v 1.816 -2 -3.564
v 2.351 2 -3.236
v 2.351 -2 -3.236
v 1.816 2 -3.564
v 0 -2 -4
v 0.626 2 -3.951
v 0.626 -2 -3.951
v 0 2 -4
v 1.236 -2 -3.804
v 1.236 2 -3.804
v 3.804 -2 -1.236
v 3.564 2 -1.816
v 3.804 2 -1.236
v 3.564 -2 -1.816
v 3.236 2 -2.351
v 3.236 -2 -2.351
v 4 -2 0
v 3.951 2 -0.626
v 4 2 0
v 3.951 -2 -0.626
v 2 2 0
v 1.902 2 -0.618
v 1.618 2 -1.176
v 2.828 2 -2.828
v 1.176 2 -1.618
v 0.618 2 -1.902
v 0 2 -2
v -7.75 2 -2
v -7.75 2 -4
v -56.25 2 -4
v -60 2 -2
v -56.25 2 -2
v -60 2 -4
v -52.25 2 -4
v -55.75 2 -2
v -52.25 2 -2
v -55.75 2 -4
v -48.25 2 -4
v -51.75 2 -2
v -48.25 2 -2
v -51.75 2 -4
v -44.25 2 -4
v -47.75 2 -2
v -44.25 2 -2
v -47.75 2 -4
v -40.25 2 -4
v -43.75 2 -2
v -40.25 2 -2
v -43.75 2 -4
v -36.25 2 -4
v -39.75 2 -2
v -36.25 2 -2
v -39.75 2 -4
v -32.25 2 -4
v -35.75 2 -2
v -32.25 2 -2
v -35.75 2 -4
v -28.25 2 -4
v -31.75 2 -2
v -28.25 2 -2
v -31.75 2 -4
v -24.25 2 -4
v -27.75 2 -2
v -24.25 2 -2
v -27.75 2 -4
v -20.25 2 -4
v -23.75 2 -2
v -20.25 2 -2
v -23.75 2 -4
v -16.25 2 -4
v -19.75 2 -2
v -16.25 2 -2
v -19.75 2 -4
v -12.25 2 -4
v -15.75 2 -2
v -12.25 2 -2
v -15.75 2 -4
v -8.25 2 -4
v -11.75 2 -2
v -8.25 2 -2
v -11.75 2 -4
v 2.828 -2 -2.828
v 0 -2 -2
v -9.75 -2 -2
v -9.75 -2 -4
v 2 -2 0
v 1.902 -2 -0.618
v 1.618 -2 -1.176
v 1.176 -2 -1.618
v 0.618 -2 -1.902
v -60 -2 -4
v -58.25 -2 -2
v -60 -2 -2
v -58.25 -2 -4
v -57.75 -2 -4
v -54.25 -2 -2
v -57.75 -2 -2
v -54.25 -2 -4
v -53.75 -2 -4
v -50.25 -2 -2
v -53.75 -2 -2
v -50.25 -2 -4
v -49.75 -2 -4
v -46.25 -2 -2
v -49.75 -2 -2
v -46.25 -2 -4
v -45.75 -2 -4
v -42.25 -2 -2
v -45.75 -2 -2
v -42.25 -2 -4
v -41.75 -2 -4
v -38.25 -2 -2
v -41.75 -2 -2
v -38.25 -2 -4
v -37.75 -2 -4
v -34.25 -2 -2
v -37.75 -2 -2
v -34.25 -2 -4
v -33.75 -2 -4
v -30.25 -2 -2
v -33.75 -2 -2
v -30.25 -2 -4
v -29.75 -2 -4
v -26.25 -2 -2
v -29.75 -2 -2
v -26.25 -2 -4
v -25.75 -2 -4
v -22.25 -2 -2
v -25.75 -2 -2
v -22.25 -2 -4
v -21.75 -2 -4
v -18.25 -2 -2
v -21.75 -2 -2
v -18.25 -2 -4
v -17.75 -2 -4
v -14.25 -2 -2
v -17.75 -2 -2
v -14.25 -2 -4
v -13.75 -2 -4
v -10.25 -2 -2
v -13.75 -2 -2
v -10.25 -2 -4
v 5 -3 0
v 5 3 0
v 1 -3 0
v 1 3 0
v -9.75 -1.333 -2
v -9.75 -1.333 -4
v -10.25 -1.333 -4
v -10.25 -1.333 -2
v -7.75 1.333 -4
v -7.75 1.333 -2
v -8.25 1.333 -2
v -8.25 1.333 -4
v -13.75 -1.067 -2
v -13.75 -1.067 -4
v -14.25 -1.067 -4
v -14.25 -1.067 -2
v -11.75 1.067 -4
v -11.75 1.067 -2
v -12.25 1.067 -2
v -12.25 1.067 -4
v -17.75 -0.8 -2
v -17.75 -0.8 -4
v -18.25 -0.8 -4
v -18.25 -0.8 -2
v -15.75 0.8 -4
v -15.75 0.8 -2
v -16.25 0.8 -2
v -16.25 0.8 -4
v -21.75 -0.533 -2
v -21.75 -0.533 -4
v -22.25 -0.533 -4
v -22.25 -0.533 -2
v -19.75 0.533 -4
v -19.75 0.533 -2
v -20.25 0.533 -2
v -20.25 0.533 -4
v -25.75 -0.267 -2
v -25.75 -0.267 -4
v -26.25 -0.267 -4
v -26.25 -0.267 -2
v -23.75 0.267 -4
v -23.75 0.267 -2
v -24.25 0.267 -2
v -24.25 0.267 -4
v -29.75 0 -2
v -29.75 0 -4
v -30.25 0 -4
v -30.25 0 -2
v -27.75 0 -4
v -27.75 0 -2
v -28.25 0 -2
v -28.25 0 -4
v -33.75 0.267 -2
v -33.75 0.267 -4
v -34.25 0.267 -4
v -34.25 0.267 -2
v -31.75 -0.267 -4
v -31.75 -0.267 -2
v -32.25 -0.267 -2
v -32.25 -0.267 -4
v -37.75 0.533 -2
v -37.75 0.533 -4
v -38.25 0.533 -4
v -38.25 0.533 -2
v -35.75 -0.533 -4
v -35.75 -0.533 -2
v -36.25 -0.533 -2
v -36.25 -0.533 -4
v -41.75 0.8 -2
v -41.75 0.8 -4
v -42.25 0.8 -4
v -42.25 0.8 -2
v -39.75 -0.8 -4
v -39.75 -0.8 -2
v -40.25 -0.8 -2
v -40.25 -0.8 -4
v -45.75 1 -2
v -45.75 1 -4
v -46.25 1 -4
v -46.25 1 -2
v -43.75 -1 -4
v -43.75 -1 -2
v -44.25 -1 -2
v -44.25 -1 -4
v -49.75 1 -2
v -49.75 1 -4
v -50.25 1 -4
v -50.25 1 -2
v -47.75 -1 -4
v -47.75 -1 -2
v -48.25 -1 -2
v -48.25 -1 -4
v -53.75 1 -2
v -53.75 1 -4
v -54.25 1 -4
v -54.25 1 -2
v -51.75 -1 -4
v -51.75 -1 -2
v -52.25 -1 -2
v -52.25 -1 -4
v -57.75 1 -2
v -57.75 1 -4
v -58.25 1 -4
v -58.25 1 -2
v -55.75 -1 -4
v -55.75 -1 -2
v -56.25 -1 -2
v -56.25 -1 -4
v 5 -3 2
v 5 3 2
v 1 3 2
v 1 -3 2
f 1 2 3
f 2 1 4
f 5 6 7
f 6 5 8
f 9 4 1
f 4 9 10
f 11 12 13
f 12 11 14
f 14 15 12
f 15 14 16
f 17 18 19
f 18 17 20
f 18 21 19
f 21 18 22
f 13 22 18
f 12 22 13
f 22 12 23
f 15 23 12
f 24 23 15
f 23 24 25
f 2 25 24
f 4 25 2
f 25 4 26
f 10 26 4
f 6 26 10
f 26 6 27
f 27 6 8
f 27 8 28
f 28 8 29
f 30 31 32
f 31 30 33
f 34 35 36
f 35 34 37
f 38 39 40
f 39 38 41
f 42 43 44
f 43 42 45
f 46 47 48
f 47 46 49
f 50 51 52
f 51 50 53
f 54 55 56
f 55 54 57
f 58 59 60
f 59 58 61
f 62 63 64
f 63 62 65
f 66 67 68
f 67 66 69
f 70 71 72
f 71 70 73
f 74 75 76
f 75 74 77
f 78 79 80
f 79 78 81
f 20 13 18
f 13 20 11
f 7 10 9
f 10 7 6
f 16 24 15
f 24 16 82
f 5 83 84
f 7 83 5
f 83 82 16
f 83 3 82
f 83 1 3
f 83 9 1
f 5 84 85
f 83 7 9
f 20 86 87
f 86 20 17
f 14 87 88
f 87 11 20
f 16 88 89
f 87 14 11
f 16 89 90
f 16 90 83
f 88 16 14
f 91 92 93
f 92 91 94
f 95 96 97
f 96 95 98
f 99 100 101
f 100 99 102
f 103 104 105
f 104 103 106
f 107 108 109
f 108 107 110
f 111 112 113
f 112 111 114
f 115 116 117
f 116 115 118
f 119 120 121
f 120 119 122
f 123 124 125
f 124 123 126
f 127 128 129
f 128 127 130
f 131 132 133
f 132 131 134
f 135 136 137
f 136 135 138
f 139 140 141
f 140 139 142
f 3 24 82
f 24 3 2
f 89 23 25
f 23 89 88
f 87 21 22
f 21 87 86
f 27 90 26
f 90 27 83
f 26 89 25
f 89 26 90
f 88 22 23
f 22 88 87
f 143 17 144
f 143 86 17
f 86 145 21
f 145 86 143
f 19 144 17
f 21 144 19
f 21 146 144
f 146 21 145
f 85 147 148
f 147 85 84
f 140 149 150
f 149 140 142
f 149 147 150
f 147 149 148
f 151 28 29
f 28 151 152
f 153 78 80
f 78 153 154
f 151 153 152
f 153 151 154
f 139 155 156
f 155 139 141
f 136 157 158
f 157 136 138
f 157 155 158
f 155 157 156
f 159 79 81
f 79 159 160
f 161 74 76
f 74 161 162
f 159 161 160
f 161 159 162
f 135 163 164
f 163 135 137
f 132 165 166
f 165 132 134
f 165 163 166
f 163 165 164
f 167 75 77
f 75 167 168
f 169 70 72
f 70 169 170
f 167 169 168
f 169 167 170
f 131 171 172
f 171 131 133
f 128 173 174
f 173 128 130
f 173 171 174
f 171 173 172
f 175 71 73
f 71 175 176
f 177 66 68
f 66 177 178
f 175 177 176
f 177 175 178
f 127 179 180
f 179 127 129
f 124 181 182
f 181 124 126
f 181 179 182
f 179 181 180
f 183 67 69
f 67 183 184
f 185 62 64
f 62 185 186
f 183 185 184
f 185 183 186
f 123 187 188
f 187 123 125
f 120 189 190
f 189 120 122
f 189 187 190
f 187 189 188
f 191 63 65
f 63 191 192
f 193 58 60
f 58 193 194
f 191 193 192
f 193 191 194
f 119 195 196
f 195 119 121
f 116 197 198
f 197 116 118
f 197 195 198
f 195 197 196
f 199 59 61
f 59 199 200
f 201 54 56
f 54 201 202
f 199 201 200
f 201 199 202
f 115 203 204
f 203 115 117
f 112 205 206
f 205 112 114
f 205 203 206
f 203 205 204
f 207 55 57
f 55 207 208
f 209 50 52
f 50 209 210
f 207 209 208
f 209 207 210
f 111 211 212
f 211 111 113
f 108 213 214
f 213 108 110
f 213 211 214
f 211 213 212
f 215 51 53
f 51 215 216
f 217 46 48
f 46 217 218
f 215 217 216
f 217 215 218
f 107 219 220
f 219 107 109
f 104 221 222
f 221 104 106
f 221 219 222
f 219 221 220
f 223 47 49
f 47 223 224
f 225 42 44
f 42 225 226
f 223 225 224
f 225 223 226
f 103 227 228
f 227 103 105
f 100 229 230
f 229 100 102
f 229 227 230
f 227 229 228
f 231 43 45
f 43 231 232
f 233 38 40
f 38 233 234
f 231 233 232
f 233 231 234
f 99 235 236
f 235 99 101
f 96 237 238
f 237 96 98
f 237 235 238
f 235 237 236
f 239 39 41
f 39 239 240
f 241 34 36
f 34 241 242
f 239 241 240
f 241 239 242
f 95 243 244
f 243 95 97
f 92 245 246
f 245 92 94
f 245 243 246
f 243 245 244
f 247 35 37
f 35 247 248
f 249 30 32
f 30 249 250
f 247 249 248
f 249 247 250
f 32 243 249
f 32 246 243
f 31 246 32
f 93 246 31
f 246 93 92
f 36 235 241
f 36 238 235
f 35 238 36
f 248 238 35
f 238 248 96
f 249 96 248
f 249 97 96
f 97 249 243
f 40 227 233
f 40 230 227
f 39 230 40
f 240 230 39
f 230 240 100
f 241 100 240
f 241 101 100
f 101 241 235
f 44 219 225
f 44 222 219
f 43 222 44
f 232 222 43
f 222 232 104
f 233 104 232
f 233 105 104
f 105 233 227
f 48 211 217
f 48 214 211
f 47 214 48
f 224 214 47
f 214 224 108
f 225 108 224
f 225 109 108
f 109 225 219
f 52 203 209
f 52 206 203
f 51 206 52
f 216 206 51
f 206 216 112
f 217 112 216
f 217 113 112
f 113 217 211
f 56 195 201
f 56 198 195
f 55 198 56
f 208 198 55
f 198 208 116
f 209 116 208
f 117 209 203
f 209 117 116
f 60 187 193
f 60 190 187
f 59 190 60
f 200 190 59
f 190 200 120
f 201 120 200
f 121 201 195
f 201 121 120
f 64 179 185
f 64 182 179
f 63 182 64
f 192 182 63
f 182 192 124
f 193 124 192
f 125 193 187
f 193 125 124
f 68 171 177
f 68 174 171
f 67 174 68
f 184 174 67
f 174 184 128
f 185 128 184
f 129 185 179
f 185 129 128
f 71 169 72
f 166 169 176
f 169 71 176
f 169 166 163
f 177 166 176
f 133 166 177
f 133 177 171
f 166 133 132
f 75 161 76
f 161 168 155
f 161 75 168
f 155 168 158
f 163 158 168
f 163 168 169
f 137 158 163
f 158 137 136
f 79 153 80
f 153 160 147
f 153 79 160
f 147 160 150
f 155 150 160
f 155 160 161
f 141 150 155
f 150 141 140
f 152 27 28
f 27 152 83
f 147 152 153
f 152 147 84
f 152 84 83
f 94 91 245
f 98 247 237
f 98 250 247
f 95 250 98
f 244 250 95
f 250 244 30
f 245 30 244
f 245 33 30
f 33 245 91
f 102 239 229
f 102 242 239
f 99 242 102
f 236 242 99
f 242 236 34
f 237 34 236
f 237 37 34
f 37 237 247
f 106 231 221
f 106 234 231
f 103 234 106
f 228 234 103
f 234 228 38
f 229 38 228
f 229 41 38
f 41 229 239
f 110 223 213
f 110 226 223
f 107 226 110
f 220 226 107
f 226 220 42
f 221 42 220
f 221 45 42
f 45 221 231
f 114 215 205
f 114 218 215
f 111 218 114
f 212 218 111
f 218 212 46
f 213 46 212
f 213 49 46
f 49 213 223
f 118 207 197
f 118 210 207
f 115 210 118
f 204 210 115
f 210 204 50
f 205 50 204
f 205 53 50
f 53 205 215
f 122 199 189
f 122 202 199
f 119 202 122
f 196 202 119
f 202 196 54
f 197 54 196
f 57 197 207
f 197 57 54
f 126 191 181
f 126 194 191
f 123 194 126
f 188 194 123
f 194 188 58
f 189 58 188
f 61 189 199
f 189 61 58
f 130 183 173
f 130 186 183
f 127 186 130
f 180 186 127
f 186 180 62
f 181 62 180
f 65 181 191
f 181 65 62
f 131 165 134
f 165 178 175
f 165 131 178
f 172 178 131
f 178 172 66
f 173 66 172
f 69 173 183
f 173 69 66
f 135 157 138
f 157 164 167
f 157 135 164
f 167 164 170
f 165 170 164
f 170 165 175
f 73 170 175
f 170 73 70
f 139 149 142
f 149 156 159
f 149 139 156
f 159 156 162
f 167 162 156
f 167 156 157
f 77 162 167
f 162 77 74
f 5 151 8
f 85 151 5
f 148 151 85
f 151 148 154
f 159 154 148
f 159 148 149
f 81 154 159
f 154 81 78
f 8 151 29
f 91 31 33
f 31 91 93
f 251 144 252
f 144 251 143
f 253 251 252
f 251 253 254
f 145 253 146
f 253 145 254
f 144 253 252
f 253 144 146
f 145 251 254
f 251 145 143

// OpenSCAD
h = 2;
w = 4;
l = 60;

//translate([0,-2,5])import("zipper-pull.stl");

module turn() {
    intersection () {
        rotate([90,0,0])
            difference() {
                cylinder(r=h+h, h=w, $fn=40, center=true);
                cylinder(r=h, h=w*1.1, $fn=20, center=true);
            };
         translate([w/2,0,-w/2])
            cube([w,w*1.1,w],true);
    }
       
}

module cap() {
    translate([3*h/2,0,h/2])
        cube([h+2,w+2,h],true);
}

module tail() {
    d = -3*h/2;
    difference() {
        translate([-l/2,0,d])
            cube([l,w,h],true);
        for(i=[l/6:2*h:l]) {
            x = max(w*(l-i)/l, 1);
            translate([-i,-x,d])
                cube([1/2,w,h*1.3],true);
            translate([-i+h,x,d])
                cube([1/2,w,h*1.3],true);
        }
    }
}

cap();
turn();
tail();
